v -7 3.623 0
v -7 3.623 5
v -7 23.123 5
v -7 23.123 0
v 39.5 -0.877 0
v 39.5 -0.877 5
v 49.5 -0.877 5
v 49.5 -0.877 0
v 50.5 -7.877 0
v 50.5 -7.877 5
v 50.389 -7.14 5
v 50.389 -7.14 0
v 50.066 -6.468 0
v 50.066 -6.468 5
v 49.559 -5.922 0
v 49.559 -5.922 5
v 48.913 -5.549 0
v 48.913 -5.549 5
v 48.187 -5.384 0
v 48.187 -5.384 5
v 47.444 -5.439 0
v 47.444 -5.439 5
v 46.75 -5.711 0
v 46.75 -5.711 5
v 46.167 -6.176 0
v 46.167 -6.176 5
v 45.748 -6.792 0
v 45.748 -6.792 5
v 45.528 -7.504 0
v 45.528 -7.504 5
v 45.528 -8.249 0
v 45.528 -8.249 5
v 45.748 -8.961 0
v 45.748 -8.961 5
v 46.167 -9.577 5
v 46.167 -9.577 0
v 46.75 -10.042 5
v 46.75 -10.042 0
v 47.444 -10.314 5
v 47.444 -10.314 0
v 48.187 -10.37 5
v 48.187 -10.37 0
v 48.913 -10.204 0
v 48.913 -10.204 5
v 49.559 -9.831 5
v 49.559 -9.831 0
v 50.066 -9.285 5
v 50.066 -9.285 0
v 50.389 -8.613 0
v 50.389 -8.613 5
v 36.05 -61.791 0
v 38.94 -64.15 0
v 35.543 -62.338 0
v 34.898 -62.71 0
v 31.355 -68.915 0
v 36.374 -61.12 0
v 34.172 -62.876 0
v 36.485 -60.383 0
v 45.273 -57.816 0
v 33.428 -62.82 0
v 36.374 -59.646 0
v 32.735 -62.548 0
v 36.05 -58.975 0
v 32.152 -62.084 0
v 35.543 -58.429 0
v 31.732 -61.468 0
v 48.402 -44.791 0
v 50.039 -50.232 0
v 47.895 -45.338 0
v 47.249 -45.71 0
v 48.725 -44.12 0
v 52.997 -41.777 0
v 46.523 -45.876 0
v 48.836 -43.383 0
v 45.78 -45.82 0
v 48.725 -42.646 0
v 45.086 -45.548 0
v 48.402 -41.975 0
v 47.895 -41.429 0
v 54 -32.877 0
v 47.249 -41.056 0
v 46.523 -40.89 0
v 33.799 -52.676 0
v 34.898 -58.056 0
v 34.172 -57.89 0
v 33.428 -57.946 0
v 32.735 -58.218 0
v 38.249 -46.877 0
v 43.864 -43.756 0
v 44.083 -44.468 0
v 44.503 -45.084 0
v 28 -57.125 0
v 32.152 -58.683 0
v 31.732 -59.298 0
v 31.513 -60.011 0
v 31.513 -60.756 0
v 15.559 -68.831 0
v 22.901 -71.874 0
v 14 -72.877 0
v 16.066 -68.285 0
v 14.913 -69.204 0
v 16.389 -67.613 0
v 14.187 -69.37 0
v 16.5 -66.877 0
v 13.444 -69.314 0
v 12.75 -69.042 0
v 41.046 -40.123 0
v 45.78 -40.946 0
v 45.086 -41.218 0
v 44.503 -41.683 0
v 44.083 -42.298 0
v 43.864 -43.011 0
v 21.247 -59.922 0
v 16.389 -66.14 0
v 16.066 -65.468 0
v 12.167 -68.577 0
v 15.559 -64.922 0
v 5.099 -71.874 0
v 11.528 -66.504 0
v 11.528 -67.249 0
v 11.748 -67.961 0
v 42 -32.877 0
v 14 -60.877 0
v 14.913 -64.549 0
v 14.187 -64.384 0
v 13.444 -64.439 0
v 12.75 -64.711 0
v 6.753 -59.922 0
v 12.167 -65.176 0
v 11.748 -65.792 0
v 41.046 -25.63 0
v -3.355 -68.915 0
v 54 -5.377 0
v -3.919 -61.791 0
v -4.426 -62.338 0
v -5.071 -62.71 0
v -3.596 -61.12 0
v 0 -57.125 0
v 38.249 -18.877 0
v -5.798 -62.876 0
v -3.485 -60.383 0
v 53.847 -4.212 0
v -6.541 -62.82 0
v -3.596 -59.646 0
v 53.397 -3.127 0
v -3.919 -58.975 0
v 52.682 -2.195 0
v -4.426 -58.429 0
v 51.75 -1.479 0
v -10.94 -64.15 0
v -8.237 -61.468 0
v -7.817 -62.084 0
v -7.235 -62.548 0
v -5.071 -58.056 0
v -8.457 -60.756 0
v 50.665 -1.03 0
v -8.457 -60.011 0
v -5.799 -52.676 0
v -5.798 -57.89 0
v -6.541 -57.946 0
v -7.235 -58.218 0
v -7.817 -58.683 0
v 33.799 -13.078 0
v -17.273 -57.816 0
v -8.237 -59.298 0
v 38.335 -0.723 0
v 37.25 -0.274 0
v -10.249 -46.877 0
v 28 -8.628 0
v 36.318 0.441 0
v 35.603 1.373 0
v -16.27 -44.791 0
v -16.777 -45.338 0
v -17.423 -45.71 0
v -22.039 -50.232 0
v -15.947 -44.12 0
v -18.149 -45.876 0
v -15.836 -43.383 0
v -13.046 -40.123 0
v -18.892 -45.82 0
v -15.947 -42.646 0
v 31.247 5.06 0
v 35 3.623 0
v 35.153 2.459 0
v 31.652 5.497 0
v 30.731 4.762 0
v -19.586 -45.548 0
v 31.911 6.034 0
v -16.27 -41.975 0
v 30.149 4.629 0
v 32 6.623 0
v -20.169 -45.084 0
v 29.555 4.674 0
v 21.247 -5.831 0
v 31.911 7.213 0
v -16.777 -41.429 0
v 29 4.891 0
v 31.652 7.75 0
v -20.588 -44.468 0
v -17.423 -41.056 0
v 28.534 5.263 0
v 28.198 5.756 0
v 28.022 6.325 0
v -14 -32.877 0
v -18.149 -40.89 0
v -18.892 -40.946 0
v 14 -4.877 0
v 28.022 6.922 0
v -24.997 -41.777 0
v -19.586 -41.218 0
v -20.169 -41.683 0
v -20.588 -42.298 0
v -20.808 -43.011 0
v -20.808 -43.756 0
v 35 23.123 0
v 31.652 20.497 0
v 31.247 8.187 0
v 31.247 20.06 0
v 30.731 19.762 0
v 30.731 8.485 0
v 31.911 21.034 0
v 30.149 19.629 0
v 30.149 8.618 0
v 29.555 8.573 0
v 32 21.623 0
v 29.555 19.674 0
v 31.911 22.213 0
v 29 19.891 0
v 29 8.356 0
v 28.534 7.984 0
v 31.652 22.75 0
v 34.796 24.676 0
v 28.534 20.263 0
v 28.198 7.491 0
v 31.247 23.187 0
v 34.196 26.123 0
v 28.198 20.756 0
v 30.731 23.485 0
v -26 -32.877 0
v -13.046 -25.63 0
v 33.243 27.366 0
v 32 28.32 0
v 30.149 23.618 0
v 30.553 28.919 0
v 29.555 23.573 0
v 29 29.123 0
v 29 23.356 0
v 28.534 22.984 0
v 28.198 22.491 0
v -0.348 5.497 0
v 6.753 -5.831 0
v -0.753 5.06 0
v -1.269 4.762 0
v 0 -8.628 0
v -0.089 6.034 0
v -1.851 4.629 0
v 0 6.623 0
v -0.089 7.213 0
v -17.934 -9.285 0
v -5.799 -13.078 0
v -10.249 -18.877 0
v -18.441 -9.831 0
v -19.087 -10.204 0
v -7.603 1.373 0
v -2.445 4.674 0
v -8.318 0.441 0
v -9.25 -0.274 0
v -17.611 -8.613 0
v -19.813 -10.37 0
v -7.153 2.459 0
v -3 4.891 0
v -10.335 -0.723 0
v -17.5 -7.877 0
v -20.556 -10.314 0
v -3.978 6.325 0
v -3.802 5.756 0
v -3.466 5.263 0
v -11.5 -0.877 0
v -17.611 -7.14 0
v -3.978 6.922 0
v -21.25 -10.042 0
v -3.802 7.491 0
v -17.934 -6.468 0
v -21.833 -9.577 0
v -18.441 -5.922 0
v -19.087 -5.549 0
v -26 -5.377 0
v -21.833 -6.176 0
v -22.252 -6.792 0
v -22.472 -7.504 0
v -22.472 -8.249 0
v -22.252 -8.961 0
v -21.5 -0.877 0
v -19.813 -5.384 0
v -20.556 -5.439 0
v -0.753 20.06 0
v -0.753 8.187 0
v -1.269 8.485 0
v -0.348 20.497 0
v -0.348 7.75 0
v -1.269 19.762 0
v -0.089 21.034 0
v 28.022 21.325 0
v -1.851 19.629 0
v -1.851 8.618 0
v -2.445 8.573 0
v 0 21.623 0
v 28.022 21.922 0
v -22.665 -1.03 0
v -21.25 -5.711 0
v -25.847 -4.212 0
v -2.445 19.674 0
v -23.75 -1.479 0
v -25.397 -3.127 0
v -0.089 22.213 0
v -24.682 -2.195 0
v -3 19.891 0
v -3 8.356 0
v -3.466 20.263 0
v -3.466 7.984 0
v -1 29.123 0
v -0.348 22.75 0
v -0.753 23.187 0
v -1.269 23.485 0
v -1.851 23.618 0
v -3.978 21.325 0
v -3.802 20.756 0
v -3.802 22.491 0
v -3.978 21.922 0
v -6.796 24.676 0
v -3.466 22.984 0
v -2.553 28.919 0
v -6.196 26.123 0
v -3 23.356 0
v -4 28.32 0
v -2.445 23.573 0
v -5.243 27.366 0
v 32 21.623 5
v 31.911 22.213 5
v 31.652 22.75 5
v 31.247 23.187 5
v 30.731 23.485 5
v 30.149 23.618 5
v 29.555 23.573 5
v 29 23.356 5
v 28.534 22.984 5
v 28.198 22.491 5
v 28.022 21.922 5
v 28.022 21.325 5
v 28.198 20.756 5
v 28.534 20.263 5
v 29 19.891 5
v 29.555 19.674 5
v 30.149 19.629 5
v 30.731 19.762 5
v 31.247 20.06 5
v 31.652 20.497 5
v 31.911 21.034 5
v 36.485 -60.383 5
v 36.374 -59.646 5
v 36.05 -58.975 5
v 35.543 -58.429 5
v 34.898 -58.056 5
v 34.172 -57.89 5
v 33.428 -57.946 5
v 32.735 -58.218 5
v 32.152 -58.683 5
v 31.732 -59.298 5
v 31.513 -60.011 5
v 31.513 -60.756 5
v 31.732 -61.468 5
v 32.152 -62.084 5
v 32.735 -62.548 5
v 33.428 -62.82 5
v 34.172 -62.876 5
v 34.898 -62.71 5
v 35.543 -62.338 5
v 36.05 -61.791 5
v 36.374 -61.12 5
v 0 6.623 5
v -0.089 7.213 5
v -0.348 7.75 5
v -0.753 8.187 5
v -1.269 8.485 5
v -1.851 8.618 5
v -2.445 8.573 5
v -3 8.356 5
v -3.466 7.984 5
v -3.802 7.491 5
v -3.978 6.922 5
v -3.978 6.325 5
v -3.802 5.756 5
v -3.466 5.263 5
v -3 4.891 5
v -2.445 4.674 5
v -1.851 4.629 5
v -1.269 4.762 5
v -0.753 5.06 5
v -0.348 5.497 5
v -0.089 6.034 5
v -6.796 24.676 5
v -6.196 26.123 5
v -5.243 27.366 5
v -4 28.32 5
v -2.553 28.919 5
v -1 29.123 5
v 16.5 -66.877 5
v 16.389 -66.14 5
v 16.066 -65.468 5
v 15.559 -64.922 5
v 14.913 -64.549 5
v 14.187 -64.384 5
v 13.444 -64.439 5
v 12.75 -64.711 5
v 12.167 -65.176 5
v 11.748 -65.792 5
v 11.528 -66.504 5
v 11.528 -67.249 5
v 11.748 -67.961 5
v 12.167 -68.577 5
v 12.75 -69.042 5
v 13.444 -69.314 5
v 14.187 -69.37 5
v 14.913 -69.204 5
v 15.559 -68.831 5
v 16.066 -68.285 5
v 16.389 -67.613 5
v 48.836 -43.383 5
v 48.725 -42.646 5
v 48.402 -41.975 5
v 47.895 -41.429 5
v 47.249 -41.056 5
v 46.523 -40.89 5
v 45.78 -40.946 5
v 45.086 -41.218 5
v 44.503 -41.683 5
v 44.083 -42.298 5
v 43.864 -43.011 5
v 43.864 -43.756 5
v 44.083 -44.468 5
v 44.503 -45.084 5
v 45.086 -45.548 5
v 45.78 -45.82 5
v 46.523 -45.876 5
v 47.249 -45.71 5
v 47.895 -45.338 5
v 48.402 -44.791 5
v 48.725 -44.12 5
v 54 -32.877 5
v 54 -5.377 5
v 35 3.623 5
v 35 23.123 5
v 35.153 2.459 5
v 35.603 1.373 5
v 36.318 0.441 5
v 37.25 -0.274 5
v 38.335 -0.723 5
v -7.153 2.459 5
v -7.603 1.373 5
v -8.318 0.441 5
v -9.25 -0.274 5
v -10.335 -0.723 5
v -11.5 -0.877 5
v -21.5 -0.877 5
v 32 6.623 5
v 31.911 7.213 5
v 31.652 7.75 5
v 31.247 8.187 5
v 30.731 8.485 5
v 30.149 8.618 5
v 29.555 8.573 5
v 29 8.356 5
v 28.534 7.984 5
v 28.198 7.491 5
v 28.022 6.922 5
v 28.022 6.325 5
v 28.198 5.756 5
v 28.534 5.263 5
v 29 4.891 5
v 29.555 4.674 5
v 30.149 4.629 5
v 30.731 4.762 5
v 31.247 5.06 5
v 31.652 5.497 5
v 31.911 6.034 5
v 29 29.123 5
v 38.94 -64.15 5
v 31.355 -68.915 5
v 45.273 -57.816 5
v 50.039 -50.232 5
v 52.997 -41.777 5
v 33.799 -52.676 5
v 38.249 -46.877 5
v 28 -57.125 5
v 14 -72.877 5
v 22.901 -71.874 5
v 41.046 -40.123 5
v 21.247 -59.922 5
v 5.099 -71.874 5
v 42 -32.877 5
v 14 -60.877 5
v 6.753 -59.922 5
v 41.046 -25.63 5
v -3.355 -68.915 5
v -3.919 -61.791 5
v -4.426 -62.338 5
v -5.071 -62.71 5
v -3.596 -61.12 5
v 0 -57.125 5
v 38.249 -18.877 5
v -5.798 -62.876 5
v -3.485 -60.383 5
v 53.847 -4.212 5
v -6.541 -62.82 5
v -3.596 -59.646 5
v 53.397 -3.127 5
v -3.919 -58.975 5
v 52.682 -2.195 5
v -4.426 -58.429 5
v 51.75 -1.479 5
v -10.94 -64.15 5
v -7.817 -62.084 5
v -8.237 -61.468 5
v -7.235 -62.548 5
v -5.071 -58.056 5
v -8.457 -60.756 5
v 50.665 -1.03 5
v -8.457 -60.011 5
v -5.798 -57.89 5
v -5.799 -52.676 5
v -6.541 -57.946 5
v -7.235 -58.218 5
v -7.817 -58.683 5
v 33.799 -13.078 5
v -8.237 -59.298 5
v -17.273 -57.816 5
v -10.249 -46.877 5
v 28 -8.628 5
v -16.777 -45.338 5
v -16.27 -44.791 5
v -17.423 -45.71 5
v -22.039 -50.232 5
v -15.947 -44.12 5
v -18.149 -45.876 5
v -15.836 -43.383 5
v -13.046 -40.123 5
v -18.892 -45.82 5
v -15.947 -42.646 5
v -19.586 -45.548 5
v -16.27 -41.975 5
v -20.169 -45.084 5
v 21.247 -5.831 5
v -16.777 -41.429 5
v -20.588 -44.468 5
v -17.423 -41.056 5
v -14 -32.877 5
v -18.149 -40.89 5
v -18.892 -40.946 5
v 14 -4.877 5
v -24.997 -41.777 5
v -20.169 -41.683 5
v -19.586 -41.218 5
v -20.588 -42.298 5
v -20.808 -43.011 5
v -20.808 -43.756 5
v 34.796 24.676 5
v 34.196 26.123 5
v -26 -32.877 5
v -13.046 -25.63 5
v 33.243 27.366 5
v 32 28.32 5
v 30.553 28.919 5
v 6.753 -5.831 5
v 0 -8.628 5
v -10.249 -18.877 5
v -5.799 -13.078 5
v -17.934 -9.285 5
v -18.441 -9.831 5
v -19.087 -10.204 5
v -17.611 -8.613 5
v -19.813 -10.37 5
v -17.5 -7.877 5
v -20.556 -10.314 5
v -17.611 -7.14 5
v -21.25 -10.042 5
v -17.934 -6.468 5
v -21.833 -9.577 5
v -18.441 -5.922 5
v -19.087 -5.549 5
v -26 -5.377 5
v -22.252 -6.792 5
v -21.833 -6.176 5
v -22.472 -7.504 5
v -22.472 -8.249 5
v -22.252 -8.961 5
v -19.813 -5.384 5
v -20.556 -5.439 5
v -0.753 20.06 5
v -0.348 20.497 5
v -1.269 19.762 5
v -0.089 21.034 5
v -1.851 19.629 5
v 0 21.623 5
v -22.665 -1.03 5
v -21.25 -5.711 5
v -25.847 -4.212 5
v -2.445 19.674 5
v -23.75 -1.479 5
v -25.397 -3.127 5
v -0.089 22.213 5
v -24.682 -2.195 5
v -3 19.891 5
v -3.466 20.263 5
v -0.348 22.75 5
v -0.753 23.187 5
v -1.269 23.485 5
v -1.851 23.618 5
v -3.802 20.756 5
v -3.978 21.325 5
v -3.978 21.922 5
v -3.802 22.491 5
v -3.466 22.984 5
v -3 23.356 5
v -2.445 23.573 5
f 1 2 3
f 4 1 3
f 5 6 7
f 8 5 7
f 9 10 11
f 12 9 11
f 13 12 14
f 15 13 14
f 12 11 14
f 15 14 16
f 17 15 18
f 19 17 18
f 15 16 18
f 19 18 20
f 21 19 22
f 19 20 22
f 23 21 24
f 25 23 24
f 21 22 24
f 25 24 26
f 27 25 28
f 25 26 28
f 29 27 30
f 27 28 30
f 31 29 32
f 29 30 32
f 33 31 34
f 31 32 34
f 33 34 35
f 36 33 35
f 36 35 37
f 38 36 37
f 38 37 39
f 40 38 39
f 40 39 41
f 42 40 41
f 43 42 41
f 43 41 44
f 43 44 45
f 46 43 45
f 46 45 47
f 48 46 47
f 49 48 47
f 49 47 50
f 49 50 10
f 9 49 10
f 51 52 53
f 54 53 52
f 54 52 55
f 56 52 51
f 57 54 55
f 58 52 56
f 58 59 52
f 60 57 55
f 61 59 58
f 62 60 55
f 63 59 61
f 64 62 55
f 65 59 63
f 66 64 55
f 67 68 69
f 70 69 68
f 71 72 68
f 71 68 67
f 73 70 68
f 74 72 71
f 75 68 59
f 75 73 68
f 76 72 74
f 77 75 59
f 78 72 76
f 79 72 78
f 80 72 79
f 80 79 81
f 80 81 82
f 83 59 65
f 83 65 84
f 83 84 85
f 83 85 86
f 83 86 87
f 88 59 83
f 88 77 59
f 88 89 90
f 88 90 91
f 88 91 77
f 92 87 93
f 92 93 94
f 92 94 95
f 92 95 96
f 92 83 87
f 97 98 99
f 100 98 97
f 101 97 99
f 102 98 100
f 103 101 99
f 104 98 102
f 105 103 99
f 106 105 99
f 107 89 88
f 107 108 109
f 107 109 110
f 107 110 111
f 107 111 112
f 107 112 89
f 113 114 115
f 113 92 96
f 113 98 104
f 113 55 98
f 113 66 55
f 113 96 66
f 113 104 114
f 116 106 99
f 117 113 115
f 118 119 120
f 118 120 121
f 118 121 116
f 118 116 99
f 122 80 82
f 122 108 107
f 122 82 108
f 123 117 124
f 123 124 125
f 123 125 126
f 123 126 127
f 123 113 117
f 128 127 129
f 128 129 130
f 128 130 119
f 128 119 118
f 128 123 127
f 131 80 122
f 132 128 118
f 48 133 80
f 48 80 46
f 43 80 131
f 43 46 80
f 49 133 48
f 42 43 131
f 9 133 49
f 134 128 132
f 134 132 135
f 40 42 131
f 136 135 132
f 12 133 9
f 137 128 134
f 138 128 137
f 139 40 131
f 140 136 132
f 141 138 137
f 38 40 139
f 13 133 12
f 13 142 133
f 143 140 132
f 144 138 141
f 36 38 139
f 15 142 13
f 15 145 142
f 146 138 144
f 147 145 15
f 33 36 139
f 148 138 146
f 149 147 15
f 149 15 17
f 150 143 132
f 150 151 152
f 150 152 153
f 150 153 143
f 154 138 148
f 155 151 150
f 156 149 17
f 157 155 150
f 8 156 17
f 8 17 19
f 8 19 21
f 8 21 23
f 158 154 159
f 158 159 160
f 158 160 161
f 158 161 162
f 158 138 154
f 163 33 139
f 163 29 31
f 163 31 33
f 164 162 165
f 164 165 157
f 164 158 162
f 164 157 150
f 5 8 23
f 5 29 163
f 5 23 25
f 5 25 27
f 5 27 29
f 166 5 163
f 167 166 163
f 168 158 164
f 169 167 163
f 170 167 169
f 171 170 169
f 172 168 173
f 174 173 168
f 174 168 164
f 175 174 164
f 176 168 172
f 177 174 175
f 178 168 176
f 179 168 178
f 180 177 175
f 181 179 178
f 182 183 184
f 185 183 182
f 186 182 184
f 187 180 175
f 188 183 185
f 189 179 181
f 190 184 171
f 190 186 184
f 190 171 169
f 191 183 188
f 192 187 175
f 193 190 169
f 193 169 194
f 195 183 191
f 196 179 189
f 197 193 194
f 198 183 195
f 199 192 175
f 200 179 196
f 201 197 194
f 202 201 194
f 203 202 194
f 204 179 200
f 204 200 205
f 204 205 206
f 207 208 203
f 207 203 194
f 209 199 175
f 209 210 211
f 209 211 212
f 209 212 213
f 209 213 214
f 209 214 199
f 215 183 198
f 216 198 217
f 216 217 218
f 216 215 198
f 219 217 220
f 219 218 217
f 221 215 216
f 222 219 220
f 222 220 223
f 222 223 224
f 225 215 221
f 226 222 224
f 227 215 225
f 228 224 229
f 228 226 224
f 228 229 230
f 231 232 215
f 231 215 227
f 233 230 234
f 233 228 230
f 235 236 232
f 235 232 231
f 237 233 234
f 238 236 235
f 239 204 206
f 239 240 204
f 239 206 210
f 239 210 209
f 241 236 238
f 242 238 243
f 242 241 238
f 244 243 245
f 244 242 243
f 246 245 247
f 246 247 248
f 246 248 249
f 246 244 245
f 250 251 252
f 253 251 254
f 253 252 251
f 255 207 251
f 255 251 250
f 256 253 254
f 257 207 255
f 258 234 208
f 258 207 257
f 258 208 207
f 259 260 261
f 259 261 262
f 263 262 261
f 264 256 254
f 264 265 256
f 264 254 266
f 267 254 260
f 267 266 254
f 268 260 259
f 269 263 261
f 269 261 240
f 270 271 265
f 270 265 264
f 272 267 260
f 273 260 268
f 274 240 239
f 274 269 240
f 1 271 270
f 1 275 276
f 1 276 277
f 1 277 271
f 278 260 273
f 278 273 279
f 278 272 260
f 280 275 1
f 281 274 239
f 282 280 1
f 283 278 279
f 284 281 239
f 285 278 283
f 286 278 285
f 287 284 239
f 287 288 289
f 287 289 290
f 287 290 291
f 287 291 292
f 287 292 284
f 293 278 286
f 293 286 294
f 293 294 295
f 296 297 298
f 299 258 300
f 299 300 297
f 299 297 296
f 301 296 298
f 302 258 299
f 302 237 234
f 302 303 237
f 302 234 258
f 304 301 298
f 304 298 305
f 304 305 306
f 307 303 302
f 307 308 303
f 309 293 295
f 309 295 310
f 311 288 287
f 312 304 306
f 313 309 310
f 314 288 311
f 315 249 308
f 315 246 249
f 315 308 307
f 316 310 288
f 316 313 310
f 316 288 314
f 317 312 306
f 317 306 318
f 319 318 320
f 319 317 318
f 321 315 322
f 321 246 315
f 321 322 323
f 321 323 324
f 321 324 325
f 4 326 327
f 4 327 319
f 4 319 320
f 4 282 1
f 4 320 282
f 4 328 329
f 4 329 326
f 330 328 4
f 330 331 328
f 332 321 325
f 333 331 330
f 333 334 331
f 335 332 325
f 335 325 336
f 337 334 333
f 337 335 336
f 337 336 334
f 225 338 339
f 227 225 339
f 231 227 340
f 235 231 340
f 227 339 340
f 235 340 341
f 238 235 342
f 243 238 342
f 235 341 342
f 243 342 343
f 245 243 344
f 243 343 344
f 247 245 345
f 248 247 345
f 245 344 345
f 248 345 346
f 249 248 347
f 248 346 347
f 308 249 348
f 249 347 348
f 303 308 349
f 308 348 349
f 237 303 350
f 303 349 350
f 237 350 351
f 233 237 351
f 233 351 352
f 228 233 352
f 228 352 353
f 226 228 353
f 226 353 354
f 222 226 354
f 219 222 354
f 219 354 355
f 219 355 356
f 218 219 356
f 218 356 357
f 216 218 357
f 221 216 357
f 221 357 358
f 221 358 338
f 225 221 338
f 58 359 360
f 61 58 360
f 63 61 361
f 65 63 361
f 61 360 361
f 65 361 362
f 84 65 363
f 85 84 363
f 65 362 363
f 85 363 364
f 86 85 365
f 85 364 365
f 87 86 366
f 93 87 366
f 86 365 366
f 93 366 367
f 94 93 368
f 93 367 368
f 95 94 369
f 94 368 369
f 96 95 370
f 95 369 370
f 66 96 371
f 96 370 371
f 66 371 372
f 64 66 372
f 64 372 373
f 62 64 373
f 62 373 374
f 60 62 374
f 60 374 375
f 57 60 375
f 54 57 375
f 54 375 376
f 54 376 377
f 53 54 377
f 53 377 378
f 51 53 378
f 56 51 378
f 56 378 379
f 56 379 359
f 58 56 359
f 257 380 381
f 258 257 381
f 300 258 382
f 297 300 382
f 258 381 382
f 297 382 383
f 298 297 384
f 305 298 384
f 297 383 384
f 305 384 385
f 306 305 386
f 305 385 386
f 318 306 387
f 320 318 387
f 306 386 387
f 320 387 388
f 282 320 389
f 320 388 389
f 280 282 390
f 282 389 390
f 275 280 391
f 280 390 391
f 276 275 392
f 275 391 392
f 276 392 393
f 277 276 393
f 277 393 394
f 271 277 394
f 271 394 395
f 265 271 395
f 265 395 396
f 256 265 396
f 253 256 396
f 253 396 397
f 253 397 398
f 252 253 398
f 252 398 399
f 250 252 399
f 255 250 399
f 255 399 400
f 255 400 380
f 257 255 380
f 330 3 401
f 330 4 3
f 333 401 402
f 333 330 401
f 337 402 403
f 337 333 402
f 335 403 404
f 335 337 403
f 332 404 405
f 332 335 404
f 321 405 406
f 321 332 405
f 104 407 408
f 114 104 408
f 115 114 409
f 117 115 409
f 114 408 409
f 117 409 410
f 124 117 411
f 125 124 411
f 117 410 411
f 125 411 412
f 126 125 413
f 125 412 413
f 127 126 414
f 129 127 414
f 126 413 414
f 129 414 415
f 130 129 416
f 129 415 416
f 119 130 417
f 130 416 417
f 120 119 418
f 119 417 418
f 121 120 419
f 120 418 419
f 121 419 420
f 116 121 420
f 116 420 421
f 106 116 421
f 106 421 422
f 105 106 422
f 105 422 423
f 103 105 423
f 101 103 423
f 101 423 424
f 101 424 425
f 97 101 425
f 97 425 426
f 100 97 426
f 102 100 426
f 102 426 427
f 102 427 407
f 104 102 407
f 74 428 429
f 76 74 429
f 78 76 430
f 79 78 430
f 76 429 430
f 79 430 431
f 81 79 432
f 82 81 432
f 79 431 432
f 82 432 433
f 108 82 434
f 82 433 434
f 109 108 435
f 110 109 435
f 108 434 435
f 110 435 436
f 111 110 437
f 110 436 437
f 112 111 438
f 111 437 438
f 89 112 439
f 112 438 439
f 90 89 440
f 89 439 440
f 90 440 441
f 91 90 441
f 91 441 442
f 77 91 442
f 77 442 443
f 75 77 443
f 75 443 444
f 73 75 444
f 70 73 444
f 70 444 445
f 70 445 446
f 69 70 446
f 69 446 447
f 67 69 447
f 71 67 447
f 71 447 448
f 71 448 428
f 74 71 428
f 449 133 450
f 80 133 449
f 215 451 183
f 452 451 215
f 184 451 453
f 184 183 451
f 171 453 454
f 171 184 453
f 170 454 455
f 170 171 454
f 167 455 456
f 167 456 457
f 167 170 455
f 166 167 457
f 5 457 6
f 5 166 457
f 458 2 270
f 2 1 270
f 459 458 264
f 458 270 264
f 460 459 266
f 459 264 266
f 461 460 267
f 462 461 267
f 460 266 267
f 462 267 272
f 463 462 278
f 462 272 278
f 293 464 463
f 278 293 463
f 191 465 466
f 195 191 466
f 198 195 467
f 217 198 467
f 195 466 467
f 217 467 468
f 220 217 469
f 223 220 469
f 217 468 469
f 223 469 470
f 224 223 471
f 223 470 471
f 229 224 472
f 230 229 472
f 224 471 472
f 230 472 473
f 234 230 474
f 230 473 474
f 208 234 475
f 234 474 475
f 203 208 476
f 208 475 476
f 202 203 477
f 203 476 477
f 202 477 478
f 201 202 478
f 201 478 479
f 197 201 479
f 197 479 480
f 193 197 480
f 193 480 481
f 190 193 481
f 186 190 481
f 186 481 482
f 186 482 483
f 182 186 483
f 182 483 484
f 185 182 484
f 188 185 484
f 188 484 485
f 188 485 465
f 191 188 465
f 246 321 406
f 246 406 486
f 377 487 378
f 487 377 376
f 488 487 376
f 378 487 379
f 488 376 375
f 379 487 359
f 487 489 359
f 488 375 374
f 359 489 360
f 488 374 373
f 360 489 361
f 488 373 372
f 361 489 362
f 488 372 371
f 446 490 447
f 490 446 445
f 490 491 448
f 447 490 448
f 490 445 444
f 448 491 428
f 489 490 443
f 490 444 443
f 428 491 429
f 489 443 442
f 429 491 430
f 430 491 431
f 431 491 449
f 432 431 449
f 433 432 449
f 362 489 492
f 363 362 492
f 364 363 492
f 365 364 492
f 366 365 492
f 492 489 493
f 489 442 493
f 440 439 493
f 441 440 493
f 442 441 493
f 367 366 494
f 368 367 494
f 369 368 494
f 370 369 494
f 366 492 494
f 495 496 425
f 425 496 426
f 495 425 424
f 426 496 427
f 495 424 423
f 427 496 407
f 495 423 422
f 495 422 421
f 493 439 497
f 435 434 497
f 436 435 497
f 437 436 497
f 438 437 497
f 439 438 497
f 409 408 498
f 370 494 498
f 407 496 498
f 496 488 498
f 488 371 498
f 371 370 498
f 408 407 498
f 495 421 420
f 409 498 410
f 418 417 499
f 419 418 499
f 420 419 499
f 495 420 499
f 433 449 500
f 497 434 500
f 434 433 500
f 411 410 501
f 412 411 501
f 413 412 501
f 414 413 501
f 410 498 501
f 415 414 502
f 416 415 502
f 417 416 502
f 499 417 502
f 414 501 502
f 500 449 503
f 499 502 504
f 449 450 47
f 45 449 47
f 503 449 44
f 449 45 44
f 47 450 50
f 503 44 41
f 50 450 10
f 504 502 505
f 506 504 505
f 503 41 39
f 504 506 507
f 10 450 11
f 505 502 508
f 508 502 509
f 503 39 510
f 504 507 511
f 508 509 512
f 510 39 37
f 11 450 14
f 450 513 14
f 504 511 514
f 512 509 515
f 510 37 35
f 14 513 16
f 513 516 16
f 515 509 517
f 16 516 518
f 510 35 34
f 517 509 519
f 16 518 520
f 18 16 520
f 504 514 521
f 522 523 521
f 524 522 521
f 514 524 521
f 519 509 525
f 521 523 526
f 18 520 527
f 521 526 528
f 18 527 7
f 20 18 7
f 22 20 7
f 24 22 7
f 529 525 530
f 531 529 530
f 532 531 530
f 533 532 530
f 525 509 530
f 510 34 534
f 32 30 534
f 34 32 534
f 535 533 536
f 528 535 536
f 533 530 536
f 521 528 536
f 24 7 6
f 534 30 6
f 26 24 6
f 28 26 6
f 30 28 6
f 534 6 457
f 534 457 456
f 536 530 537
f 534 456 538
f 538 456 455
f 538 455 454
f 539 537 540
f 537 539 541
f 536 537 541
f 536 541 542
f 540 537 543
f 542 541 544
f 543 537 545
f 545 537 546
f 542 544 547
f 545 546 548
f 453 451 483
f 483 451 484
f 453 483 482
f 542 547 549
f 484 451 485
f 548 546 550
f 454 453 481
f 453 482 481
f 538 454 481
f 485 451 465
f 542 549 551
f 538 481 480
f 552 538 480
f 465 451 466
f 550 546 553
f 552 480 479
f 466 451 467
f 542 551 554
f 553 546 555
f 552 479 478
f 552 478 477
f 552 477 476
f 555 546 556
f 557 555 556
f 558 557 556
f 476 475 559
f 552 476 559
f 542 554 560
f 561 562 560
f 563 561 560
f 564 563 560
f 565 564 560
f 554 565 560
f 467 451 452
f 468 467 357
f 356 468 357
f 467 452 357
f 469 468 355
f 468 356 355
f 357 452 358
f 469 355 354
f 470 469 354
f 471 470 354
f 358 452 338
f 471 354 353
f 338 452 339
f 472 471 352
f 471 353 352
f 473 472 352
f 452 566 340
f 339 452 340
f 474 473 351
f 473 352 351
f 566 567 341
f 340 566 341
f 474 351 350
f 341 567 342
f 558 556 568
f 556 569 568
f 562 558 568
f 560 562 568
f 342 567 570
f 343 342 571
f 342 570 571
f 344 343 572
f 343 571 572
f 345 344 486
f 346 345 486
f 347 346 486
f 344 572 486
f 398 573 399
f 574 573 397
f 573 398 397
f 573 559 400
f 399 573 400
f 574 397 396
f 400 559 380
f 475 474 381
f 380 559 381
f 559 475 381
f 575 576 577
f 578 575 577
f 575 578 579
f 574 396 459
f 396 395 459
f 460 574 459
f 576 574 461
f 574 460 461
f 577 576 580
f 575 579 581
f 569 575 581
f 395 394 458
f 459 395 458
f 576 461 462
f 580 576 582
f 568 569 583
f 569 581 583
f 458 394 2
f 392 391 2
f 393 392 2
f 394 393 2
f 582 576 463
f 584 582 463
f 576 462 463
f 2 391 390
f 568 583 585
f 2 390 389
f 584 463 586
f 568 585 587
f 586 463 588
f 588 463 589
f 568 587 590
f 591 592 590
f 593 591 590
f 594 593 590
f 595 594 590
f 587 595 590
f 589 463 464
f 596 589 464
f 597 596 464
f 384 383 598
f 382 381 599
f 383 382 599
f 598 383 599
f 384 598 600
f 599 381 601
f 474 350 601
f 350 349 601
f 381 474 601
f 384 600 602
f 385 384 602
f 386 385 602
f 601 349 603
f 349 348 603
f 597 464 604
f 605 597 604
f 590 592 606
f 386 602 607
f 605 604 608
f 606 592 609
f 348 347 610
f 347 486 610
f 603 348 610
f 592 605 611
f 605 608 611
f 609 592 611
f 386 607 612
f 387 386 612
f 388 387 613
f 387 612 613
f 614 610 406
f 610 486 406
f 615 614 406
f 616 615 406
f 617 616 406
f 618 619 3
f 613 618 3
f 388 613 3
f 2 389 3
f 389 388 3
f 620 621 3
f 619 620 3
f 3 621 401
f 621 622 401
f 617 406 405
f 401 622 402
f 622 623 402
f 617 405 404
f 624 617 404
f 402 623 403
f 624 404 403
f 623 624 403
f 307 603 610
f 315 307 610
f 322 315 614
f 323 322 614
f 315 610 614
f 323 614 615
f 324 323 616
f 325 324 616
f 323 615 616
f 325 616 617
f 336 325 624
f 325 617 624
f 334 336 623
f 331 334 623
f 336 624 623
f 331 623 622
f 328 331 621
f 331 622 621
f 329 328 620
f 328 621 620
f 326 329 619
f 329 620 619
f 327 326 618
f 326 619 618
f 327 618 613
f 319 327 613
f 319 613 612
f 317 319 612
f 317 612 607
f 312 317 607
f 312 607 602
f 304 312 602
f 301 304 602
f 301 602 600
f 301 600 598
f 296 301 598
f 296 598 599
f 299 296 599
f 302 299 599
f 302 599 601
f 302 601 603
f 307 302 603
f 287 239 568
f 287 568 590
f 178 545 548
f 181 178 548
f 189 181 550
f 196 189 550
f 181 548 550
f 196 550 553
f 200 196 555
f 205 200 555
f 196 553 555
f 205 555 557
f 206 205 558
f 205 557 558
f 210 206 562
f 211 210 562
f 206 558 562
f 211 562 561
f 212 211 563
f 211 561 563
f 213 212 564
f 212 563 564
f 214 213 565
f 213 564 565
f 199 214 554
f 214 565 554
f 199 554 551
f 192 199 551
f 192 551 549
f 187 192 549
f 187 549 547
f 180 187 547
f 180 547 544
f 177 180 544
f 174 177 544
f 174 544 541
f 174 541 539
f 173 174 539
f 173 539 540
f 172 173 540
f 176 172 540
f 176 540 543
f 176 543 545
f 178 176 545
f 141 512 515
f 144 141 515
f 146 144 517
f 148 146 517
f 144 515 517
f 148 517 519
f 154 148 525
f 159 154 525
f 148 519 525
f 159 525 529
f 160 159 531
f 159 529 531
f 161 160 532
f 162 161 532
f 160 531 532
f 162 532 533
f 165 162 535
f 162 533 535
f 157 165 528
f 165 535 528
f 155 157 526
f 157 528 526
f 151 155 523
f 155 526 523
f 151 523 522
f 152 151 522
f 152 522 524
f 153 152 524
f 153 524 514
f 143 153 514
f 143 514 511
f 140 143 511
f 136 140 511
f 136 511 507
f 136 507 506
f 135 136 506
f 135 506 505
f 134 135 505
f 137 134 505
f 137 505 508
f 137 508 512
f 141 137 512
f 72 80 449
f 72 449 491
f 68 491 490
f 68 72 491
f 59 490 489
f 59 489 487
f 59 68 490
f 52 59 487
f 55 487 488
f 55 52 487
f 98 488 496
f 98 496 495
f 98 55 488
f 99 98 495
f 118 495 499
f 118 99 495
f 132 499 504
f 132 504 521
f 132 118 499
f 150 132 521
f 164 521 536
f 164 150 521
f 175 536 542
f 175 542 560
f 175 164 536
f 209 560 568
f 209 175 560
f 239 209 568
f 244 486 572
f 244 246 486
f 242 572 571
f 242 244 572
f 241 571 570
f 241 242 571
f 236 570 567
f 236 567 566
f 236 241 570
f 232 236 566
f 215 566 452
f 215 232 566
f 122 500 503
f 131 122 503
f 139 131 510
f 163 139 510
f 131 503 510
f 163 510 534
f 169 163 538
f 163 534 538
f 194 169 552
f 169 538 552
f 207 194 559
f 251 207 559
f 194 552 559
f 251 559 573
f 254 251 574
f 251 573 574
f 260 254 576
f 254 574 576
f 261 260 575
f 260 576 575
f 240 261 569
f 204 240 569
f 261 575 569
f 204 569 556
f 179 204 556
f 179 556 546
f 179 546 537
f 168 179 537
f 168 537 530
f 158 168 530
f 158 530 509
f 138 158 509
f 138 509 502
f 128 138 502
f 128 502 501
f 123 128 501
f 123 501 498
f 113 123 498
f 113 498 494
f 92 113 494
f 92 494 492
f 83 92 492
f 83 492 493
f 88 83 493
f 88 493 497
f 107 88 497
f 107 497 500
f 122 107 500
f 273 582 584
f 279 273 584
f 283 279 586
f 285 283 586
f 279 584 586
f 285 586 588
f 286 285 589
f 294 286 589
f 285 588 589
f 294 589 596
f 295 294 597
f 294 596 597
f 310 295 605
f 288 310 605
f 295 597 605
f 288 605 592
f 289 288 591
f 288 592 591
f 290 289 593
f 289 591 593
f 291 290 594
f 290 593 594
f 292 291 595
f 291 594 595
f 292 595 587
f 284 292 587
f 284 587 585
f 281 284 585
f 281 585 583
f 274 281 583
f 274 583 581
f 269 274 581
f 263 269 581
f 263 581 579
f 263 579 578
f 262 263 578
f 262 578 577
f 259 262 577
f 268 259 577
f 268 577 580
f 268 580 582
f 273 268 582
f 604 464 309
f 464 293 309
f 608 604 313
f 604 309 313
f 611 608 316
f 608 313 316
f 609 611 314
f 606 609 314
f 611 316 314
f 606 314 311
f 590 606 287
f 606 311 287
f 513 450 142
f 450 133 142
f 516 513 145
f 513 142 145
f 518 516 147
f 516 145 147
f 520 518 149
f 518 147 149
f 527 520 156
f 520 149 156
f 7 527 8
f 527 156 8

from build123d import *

# Parameters (mm, degrees)
EXTRUDE_1_DEPTH     = 5
SKETCH_2_R          = 28
CUT_EXTRUDE_1_DEPTH = 91.840456458
SKETCH_3_W          = 19
SKETCH_3_H          = 30
CUT_EXTRUDE_2_DEPTH = 91.840456458
FILLET_2_R          = 4.5
SKETCH_4_W          = 19
SKETCH_4_H          = 30
CUT_EXTRUDE_3_DEPTH = 5
FILLET_3_R          = 4.5
SKETCH_6_R          = 2.5
CUT_EXTRUDE_5_DEPTH = 91.840456458
FILLET_4_R          = 6
SKETCH_7_R          = 2.5
CUT_EXTRUDE_6_DEPTH = 91.840456458
SKETCH_8_R          = 2
CUT_EXTRUDE_7_DEPTH = 91.840456458


with BuildPart() as part:
    # 草图1 → 凸台-拉伸1 (new body)
    with BuildSketch(Plane.XY):
        with BuildLine():
            Line((-26, 29.123470654), (54, 29.123470654))
            Line((54, 29.123470654), (54, -32.876529346))
            ThreePointArc((54, -32.876529346), (14, -72.876529346), (-26, -32.876529346))
            Line((-26, -32.876529346), (-26, 29.123470654))
        make_face()
    extrude(amount=EXTRUDE_1_DEPTH)

    # 草图2 → 切除-拉伸1 (cut, through all)
    with BuildSketch(Plane.XY.offset(5)):
        with Locations((14, -32.876529346)):
            Circle(SKETCH_2_R)
    extrude(amount=-CUT_EXTRUDE_1_DEPTH, mode=Mode.SUBTRACT)

    # 草图3 → 切除-拉伸2 (cut, through all)
    with BuildSketch(Plane.XY.offset(5)):
        with Locations((44.5, 14.123470654)):
            Rectangle(SKETCH_3_W, SKETCH_3_H)
    extrude(amount=-CUT_EXTRUDE_2_DEPTH, mode=Mode.SUBTRACT)

    # 圆角2
    fillet_2_edges = [part.edges().sort_by_distance(p)[0] for p in [
        (54, -0.876529346, 2.5),
        (35, -0.876529346, 2.5),
    ]]
    fillet(fillet_2_edges, radius=FILLET_2_R)

    # 草图4 → 切除-拉伸3 (cut)
    with BuildSketch(Plane.XY.offset(5)):
        with Locations((-16.5, 14.123470654)):
            Rectangle(SKETCH_4_W, SKETCH_4_H)
    extrude(amount=-CUT_EXTRUDE_3_DEPTH, mode=Mode.SUBTRACT)

    # 圆角3
    fillet_3_edges = [part.edges().sort_by_distance(p)[0] for p in [
        (-26, -0.876529346, 2.5),
        (-7, -0.876529346, 2.5),
    ]]
    fillet(fillet_3_edges, radius=FILLET_3_R)

    # 草图6 → 切除-拉伸5 (cut, through all)
    with BuildSketch(Plane.XY.offset(5)):
        with Locations((-20, -7.876529346)):
            Circle(SKETCH_6_R)
        with Locations((48, -7.876529346)):
            Circle(SKETCH_6_R)
    extrude(amount=-CUT_EXTRUDE_5_DEPTH, mode=Mode.SUBTRACT)

    # 圆角4
    fillet_4_edges = [part.edges().sort_by_distance(p)[0] for p in [
        (35, 29.123470654, 2.5),
        (-7, 29.123470654, 2.5),
    ]]
    fillet(fillet_4_edges, radius=FILLET_4_R)

    # 草图7 → 切除-拉伸6 (cut, through all)
    with BuildSketch(Plane.XY.offset(5)):
        with Locations((14, -66.876529346)):
            Circle(SKETCH_7_R)
        with Locations((-5.984698578, -60.383107155)):
            Circle(SKETCH_7_R)
        with Locations((-18.335921554, -43.383107155)):
            Circle(SKETCH_7_R)
        with Locations((46.335921554, -43.383107155)):
            Circle(SKETCH_7_R)
        with Locations((33.984698578, -60.383107155)):
            Circle(SKETCH_7_R)
    extrude(amount=-CUT_EXTRUDE_6_DEPTH, mode=Mode.SUBTRACT)

    # 草图8 → 切除-拉伸7 (cut, through all)
    with BuildSketch(Plane.XY.offset(5)):
        with Locations((-2, 6.623470654)):
            Circle(SKETCH_8_R)
        with Locations((-2, 21.623470654)):
            Circle(SKETCH_8_R)
        with Locations((30, 21.623470654)):
            Circle(SKETCH_8_R)
        with Locations((30, 6.623470654)):
            Circle(SKETCH_8_R)
    extrude(amount=-CUT_EXTRUDE_7_DEPTH, mode=Mode.SUBTRACT)


solid = part.part
